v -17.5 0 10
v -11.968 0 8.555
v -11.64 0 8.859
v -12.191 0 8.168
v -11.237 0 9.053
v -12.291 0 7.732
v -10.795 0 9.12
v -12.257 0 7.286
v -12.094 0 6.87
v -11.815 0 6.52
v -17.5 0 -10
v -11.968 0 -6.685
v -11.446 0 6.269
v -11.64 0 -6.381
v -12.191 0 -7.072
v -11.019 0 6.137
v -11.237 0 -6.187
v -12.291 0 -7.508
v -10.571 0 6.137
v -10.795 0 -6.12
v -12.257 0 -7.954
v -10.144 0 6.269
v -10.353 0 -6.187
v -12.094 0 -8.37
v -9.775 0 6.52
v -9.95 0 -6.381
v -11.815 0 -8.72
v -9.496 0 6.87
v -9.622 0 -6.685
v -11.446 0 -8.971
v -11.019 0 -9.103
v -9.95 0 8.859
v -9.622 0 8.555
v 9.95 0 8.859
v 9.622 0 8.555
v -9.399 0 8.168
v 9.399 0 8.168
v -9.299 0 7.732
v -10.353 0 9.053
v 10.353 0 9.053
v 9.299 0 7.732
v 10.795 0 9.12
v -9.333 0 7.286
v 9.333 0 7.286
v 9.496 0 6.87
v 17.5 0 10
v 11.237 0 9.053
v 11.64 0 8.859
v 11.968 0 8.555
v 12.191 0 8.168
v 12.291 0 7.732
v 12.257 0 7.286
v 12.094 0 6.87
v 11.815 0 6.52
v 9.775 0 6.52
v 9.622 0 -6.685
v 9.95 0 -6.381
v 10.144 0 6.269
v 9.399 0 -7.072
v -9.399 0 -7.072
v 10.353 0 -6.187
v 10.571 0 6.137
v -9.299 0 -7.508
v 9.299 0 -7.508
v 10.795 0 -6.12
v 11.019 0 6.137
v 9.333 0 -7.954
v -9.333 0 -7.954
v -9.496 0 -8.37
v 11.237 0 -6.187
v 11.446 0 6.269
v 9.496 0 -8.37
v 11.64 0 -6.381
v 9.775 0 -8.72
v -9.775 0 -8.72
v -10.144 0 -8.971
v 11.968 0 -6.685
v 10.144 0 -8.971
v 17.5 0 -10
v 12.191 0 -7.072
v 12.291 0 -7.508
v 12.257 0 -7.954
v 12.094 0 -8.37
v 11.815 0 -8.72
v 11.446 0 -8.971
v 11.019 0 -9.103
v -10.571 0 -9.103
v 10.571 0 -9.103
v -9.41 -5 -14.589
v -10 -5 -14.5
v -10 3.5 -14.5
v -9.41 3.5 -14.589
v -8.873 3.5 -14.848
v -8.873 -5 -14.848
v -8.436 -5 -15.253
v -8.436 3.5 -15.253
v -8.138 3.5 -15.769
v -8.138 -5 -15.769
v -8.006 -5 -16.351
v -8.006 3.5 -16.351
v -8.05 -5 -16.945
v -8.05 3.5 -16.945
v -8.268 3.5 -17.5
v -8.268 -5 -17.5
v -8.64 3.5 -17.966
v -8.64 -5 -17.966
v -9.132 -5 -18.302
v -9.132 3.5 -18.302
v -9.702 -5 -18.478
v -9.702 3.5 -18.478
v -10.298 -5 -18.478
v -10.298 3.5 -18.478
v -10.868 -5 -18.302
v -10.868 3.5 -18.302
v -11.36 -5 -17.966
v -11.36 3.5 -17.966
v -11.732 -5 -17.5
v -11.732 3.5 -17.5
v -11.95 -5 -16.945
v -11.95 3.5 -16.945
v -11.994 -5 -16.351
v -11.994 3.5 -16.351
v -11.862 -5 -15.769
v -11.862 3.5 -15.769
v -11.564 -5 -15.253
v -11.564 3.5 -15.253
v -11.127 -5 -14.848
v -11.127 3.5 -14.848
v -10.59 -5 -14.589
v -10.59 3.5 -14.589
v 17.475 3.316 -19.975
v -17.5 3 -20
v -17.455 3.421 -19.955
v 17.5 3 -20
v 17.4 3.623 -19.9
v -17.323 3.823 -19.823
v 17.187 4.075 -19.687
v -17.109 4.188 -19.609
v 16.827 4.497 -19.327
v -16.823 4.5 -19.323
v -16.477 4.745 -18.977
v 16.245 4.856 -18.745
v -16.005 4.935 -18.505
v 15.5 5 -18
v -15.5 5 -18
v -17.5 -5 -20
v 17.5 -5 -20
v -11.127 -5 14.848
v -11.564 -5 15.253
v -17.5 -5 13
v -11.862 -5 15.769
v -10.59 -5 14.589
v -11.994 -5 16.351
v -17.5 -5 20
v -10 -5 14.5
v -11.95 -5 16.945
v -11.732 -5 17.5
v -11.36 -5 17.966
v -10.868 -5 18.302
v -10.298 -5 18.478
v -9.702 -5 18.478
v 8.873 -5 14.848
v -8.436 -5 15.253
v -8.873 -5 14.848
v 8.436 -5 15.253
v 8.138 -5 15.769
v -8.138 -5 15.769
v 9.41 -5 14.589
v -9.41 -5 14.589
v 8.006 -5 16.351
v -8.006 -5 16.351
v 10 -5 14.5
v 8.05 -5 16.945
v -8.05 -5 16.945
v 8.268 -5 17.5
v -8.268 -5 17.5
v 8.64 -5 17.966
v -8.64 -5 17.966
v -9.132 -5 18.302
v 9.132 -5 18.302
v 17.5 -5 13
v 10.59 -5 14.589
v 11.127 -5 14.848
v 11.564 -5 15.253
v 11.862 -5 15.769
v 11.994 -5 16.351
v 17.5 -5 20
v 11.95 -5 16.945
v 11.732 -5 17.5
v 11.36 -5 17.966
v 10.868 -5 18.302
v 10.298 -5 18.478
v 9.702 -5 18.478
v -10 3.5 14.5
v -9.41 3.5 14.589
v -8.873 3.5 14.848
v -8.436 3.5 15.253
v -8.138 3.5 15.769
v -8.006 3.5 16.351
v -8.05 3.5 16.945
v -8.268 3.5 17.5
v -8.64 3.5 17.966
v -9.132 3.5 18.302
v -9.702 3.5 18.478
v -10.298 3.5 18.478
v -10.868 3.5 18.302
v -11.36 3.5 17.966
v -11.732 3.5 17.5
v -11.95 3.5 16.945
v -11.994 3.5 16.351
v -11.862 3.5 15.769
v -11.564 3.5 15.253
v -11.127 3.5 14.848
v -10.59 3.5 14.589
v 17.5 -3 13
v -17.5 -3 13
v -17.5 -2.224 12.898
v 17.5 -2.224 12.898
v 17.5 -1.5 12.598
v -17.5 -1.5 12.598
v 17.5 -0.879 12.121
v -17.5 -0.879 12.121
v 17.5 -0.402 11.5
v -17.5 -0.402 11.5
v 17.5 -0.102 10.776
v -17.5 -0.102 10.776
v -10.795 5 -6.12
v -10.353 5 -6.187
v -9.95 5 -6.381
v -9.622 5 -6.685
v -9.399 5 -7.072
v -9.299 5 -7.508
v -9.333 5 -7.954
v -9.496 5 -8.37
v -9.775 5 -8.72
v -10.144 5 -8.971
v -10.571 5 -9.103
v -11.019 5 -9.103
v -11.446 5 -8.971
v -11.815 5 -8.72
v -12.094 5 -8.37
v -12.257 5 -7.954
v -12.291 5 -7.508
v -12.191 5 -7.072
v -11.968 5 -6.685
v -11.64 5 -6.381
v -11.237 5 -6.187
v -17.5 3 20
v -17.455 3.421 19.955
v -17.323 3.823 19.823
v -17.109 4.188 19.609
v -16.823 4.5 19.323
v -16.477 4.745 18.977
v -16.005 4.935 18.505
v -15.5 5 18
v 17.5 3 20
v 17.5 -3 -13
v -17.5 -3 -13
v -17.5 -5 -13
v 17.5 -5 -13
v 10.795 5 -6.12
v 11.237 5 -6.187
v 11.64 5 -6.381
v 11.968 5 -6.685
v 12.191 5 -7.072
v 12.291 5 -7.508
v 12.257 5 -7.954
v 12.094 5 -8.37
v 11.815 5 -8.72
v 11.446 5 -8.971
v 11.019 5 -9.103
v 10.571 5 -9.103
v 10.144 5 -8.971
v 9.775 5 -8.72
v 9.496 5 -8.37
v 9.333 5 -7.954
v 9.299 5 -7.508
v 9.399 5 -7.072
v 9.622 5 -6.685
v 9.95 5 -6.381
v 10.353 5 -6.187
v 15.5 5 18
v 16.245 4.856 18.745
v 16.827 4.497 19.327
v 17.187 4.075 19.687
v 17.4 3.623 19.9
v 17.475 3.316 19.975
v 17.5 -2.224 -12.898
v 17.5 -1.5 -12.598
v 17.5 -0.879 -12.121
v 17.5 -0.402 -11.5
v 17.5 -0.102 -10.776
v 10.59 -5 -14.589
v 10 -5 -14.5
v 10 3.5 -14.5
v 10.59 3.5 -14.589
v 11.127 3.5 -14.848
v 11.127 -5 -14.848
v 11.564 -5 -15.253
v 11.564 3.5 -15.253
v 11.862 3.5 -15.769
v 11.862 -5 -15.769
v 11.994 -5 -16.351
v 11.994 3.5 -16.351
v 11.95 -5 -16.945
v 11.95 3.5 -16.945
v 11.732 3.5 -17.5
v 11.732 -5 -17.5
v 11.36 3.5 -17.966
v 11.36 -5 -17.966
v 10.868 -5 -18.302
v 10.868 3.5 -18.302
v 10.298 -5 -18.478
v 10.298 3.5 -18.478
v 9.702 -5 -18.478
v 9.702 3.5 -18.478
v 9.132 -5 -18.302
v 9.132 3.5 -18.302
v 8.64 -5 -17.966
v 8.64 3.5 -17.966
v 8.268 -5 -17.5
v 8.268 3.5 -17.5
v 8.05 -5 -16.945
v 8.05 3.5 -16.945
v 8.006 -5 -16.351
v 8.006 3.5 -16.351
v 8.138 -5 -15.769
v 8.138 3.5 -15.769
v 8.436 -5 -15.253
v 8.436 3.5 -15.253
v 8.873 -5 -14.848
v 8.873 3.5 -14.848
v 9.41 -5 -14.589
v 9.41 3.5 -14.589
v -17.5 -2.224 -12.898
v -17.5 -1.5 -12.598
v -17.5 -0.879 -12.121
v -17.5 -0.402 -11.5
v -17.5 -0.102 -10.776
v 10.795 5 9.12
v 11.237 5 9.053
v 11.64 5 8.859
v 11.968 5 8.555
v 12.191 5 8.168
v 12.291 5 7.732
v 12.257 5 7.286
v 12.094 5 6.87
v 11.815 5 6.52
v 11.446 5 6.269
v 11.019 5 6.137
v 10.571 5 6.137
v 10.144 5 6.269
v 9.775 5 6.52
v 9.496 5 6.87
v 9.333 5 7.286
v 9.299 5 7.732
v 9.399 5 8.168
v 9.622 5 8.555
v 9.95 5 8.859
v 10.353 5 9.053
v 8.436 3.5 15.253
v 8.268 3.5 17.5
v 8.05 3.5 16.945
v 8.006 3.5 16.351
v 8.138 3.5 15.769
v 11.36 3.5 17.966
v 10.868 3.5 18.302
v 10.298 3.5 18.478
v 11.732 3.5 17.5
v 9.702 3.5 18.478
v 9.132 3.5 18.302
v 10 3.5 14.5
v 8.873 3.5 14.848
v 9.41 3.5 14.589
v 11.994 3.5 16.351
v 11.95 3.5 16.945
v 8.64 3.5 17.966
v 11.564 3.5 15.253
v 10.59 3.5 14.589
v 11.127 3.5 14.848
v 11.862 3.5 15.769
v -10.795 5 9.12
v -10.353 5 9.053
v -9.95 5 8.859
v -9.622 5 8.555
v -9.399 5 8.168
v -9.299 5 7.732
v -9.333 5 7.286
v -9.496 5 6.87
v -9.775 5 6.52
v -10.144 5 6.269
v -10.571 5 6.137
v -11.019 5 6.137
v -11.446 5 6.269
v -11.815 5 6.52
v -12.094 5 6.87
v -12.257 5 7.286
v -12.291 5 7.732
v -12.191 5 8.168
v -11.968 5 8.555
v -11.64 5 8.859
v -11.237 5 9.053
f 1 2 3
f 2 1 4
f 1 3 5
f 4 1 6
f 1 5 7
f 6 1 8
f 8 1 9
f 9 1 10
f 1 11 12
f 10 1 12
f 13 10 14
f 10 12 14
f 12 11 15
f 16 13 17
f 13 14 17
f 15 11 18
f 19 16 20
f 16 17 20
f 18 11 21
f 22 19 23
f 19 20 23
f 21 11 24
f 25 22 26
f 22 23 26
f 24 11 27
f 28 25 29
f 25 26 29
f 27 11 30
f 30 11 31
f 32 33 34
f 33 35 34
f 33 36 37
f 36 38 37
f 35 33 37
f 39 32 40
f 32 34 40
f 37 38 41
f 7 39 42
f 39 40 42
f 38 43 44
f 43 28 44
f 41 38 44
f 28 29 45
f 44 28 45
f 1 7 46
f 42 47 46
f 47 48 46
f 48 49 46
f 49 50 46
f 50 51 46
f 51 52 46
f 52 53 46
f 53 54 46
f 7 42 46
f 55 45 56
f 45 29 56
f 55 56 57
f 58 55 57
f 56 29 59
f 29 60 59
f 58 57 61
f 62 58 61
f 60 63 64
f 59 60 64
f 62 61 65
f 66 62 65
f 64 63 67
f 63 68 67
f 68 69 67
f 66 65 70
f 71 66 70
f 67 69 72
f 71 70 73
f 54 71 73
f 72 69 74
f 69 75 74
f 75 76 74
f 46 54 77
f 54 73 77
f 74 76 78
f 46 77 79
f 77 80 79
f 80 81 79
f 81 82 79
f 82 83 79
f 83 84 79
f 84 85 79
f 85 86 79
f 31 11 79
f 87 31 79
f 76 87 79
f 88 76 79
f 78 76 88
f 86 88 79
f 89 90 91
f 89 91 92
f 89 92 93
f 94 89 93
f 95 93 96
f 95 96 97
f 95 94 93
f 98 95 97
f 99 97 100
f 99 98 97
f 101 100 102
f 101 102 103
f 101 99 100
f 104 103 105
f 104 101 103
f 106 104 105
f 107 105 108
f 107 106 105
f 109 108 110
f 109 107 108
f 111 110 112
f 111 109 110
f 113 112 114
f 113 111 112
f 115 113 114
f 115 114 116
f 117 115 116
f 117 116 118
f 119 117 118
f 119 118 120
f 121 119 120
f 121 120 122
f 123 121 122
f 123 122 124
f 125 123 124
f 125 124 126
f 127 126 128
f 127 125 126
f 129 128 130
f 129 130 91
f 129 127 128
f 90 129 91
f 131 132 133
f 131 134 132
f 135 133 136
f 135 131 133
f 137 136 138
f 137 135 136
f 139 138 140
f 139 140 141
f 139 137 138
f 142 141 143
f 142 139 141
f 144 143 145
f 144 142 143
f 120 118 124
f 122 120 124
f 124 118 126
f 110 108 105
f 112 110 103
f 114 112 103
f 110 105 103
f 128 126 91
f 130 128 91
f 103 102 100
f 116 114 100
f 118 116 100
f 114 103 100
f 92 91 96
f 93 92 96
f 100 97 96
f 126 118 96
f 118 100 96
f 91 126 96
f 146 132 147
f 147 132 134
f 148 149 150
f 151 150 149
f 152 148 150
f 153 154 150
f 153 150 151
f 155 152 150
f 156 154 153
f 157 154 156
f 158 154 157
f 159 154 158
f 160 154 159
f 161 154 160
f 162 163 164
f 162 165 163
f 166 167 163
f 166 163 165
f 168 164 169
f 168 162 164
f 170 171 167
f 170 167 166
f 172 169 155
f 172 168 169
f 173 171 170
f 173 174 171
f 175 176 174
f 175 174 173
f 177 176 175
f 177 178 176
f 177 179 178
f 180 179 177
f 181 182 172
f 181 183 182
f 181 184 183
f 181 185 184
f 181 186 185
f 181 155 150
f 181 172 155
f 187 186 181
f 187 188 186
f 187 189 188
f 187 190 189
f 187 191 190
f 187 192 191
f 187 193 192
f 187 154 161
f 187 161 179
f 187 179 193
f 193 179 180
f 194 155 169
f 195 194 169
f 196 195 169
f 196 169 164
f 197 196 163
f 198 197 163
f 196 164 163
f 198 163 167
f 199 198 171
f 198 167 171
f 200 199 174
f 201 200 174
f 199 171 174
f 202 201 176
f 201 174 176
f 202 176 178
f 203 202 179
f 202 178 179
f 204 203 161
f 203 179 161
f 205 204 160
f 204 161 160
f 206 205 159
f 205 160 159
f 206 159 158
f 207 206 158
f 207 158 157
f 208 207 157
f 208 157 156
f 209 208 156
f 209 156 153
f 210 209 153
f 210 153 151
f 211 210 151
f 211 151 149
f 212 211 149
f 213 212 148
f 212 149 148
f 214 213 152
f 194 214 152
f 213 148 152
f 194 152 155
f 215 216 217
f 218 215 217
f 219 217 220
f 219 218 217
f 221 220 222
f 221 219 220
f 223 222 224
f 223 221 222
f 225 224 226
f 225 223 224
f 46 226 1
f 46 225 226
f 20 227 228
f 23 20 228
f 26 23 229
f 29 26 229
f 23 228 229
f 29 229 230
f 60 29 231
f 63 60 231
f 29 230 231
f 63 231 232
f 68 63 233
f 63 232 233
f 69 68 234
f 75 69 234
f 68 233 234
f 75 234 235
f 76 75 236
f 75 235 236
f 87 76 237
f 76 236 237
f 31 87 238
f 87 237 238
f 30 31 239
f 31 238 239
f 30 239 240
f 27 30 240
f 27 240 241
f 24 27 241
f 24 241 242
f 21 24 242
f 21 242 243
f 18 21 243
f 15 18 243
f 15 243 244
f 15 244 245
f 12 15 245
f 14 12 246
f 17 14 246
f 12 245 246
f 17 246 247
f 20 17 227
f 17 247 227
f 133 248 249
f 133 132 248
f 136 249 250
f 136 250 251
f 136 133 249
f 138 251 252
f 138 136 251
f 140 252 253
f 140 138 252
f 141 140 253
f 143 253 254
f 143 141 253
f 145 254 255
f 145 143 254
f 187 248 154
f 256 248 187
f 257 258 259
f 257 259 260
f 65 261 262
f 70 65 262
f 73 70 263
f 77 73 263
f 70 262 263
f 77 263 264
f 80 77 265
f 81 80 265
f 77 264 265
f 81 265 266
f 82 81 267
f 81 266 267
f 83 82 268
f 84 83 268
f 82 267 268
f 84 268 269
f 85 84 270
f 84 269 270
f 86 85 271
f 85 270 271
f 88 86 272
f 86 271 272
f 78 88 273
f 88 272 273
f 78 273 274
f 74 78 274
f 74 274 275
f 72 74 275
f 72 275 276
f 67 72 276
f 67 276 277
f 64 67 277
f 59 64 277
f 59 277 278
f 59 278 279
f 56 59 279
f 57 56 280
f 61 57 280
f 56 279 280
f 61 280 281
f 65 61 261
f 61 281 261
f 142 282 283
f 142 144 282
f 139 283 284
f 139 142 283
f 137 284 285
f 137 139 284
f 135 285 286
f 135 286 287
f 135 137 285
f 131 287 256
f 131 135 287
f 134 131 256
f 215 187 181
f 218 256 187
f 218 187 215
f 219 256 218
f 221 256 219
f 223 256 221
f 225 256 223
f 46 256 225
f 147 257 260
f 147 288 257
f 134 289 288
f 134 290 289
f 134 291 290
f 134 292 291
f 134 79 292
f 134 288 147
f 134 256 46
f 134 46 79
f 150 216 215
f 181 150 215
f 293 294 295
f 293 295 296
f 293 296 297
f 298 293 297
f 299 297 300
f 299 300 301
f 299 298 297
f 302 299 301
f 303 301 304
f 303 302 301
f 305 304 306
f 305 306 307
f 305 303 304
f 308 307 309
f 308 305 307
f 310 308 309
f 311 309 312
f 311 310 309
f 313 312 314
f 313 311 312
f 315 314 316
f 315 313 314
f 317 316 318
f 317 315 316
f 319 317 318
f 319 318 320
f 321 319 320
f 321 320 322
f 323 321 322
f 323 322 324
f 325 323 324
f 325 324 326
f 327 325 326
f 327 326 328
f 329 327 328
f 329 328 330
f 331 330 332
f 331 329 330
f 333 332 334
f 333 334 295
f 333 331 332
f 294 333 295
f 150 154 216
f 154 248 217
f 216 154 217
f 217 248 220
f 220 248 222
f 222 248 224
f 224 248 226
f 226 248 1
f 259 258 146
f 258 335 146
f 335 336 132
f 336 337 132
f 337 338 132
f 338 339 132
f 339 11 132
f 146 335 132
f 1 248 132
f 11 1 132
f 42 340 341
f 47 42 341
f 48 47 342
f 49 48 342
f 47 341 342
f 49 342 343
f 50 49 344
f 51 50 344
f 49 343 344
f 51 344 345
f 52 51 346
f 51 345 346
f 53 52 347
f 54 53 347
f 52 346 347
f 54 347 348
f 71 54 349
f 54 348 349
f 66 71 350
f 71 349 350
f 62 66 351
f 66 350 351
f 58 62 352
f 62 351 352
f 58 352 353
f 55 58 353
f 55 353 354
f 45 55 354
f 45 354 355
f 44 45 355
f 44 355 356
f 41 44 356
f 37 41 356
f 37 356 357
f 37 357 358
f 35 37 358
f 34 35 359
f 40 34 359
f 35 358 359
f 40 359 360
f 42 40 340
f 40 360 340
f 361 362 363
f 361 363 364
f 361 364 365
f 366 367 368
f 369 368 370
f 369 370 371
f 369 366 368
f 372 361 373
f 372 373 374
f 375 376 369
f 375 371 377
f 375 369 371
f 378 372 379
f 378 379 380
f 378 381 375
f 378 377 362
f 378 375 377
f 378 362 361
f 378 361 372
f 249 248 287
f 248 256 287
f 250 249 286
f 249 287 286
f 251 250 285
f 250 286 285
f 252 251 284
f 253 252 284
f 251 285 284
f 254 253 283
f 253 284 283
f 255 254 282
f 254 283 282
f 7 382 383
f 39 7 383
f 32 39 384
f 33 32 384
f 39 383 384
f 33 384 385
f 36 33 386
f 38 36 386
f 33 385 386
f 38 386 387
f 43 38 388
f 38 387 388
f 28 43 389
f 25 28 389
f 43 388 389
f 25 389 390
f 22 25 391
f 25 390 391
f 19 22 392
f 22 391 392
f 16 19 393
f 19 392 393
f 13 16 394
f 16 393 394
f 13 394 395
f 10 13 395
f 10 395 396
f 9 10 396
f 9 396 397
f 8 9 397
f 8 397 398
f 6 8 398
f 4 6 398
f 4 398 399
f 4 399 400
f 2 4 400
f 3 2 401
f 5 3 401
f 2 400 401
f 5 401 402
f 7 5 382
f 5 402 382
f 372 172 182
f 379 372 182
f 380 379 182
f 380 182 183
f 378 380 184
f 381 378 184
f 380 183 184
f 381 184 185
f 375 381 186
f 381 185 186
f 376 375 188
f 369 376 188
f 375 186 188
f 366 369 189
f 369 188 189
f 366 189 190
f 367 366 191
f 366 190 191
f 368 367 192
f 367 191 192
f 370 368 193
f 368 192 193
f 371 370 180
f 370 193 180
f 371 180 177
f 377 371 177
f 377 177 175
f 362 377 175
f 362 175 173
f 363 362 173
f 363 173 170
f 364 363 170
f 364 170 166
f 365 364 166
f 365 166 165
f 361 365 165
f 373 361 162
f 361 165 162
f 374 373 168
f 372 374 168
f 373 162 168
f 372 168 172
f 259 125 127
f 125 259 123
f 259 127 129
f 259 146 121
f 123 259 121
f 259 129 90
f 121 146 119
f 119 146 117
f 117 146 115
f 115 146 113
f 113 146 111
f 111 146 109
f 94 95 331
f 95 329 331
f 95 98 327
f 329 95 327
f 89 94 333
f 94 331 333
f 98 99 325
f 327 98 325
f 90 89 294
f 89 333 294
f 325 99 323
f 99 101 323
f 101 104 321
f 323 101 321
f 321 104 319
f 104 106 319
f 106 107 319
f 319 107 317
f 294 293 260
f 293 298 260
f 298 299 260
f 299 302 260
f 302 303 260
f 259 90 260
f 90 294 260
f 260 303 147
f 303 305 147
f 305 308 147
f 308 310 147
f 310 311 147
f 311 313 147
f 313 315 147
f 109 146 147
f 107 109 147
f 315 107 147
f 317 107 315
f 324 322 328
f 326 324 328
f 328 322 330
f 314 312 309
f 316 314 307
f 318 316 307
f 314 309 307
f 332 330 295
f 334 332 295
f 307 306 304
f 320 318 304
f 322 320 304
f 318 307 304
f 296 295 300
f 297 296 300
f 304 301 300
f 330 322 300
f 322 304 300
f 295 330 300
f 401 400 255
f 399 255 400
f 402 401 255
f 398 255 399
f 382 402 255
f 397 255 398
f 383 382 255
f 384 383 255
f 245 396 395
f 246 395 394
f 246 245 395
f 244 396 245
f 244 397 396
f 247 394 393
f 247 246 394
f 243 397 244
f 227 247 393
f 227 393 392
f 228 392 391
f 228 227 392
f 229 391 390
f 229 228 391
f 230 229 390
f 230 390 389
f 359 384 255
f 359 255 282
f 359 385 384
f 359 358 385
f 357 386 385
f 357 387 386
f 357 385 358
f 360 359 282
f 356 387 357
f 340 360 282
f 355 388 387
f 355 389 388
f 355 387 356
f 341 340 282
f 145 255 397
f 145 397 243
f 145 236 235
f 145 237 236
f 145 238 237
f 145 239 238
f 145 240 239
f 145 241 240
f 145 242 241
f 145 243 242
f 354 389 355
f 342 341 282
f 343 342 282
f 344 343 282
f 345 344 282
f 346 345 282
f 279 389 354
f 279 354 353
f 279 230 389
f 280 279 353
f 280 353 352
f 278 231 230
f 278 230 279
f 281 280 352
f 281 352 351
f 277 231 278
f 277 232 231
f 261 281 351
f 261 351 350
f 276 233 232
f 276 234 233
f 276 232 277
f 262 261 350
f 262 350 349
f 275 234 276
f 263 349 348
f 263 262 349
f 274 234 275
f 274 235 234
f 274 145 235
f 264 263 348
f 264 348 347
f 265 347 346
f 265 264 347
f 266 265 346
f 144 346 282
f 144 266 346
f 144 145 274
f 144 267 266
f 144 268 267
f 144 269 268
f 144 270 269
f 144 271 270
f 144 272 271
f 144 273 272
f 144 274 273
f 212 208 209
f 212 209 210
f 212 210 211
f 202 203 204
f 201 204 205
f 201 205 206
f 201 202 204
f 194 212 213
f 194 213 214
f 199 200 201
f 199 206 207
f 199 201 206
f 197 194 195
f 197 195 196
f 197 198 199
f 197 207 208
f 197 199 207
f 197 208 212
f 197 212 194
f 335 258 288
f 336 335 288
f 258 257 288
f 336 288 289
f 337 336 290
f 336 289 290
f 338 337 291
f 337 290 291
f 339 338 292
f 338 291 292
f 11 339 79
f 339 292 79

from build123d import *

# Parameters (mm, degrees)
SKETCH1_W            = 35
SKETCH1_H            = 40
BOSS_EXTRUDE1_DEPTH  = 5
SKETCH2_R            = 1.5
CUT_EXTRUDE1_DEPTH   = 5
SKETCH3_W            = 35
SKETCH3_H            = 7
BOSS_EXTRUDE2_DEPTH  = 5
SKETCH5_R            = 2
CUT_EXTRUDE3_DEPTH   = 8.5
FILLET2_R            = 3
FILLET3_R            = 2
FILLET2_OF_MIRROR2_R = 3


with BuildPart() as part:
    # Sketch1 → Boss-Extrude1 (new body)
    with BuildSketch(Plane(origin=(0, 0, 0), x_dir=(1, 0, 0), z_dir=(0, 1, 0))):
        Rectangle(SKETCH1_W, SKETCH1_H)
    extrude(amount=BOSS_EXTRUDE1_DEPTH)

    # Sketch2 → Cut-Extrude1 (cut)
    with BuildSketch(Plane(origin=(0, 5, 0), x_dir=(1, 0, 0), z_dir=(0, 1, 0))):
        with Locations(Location((-10.795, 7.62, 0), (0, 0, 270))):
            Circle(SKETCH2_R)
        with Locations(Location((10.795, 7.62, 0), (0, 0, 270))):
            Circle(SKETCH2_R)
        with Locations(Location((-10.795, -7.62, 0), (0, 0, 270))):
            Circle(SKETCH2_R)
        with Locations(Location((10.795, -7.62, 0), (0, 0, 270))):
            Circle(SKETCH2_R)
    extrude(amount=-CUT_EXTRUDE1_DEPTH, mode=Mode.SUBTRACT)

    # Sketch3 → Boss-Extrude2 (add)
    with BuildSketch(Plane.XZ):
        with Locations((0, 16.5)):
            Rectangle(SKETCH3_W, SKETCH3_H)
    boss_extrude2 = extrude(amount=BOSS_EXTRUDE2_DEPTH)

    # Sketch5 → Cut-Extrude3 (cut)
    with BuildSketch(Plane.XZ.offset(5)):
        with Locations(Location((-10, 16.5, 0), (0, 0, 270))):
            Circle(SKETCH5_R)
        with Locations(Location((10, 16.5, 0), (0, 0, 270))):
            Circle(SKETCH5_R)
    cut_extrude3 = extrude(amount=-CUT_EXTRUDE3_DEPTH, mode=Mode.SUBTRACT)

    # Fillet2
    fillet2_edges = [part.edges().sort_by_distance(p)[0] for p in [
        (0, 0, 13),
    ]]
    fillet(fillet2_edges, radius=FILLET2_R)

    # Fillet3
    fillet3_edges = [part.edges().sort_by_distance(p)[0] for p in [
        (17.5, 5, 0),
        (0, 5, -20),
        (-17.5, 5, 0),
        (0, 5, 20),
    ]]
    fillet(fillet3_edges, radius=FILLET3_R)

    # Mirror2: Boss-Extrude2, Cut-Extrude3 across plane
    add(boss_extrude2.mirror(Plane.XY))
    add(cut_extrude3.mirror(Plane.XY), mode=Mode.SUBTRACT)

    # Fillet2 of Mirror2
    fillet2_of_mirror2_edges = [part.edges().sort_by_distance(p)[0] for p in [
        (0, 0, -13),
    ]]
    fillet(fillet2_of_mirror2_edges, radius=FILLET2_OF_MIRROR2_R)


solid = part.part
